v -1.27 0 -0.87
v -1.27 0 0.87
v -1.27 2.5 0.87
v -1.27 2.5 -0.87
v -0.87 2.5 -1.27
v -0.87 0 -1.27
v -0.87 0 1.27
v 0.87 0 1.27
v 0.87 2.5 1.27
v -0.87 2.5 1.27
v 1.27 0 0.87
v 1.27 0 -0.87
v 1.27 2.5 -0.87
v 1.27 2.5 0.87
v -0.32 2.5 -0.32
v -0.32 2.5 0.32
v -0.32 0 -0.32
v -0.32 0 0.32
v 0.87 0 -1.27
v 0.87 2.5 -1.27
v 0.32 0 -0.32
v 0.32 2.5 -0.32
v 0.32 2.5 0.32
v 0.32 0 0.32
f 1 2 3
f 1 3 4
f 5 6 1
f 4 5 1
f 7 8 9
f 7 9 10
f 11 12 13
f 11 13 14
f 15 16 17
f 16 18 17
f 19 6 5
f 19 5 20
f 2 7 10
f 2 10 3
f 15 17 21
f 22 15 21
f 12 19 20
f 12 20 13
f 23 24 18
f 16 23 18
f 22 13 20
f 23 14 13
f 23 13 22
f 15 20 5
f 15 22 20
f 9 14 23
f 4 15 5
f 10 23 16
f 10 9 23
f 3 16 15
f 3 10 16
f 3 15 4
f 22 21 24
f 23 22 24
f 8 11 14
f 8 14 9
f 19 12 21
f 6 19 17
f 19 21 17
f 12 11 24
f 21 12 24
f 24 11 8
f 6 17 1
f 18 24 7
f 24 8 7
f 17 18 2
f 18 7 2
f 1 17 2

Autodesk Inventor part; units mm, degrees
ref_plane "YZ Plane" through (0, 0, 0) normal (1, 0, 0) x (0, 1, 0)
ref_plane "XZ Plane" through (0, 0, 0) normal (0, 1, 0) x (-1, 0, 0)
ref_plane "XY Plane" through (0, 0, 0) normal (0, 0, 1) x (1, 0, 0)
sketch "Sketch1" plane through (0, 0, 0) normal (0, 1, 0) x (-1, 0, 0)
  line L0 (0.87, -1.27) -> (-0.87, -1.27)
  line L1 (-1.27, -0.87) -> (-1.27, 0.87)
  line L2 (-0.87, 1.27) -> (0.87, 1.27)
  line L3 (1.27, 0.87) -> (1.27, -0.87)
  line L4 (1.27, -1.27) -> (-1.27, 1.27) construction
  line L5 (-1.27, -1.27) -> (1.27, 1.27) construction
  line L6 (0.32, -0.32) -> (-0.32, -0.32)
  line L7 (-0.32, -0.32) -> (-0.32, 0.32)
  line L8 (-0.32, 0.32) -> (0.32, 0.32)
  line L9 (0.32, 0.32) -> (0.32, -0.32)
  line L10 (0.32, -0.32) -> (-0.32, 0.32) construction
  line L11 (-0.32, -0.32) -> (0.32, 0.32) construction
  line L12 (0.87, -1.27) -> (1.27, -0.87)
  line L13 (-0.87, -1.27) -> (-1.27, -0.87)
  line L14 (-1.27, 0.87) -> (-0.87, 1.27)
  line L15 (0.87, 1.27) -> (1.27, 0.87)
  point P0 (0, 0)
  dimension "d0" = 2.54
  dimension "d1" = 2.54
  dimension "d2" = 0.64
  dimension "d3" = 0.64
  dimension "d4" = 0.4
  dimension "d5" = 0.4
  dimension "d6" = 0.4
  dimension "d7" = 0.4
  dimension "d8" = 0.4
  dimension "d9" = 0.4
  dimension "d10" = 0.4
  dimension "d11" = 0.4
extrude "Extrusion1" add sketch "Sketch1" along normal blind 2.5
equation "\"d5\" = d4"
equation "\"d6\" = d4"
equation "\"d7\" = d6"
equation "\"d8\" = d4"
equation "\"d9\" = d8"
equation "\"d10\" = d4"
equation "\"d11\" = d10"
properties part number "Holder" material "ABS Plastic"
